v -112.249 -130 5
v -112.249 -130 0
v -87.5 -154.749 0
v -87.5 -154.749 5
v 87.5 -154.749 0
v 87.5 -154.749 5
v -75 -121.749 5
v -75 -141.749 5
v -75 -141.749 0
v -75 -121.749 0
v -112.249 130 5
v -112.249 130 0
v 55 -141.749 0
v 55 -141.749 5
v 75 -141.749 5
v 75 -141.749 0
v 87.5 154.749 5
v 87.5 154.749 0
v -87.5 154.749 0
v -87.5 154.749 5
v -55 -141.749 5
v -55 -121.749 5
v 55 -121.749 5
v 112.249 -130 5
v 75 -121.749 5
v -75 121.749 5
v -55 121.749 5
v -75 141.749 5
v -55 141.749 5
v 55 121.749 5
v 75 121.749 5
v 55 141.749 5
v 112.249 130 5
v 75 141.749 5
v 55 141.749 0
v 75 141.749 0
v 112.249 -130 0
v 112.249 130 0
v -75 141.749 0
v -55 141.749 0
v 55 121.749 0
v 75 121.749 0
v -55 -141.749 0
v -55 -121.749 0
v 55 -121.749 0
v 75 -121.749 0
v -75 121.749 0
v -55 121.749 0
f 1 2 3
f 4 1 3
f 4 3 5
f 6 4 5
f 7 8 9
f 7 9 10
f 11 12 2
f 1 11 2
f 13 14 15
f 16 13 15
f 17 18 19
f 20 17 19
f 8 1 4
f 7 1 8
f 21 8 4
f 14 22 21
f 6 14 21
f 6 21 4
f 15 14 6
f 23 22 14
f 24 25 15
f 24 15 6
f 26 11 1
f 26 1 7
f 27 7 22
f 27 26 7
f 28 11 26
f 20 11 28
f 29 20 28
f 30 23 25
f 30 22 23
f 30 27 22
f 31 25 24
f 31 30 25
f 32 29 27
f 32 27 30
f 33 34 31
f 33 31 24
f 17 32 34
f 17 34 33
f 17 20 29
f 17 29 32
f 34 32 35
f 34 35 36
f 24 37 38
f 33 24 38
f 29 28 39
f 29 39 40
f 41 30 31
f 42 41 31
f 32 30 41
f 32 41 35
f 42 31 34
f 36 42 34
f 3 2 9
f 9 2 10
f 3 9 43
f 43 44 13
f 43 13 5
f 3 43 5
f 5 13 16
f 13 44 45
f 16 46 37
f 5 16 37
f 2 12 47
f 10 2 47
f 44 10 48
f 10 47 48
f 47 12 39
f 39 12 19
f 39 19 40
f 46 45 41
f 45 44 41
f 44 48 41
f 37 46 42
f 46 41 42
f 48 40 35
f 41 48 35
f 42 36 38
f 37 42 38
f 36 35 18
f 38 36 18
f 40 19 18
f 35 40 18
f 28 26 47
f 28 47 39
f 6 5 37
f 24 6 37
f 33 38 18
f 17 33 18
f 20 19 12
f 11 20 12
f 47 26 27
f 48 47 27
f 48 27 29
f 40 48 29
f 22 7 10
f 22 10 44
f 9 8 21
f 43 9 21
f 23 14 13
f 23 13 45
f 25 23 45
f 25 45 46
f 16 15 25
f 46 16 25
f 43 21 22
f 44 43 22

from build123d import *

# Parameters (mm, degrees)
BOSS_EXTRU_1_DEPTH      = 5
ESQUISSE2_W             = 20
ESQUISSE2_H             = 20
ENL_V_MAT_EXTRU_1_DEPTH = 5


with BuildPart() as part:
    # Esquisse1 → Boss.-Extru.1 (new body)
    with BuildSketch(Plane.XY):
        Polygon((-112.248737342, -130), (-87.5, -154.748737342), (87.5, -154.748737342), (112.248737342, -130), (112.248737342, 130), (87.5, 154.748737342), (-87.5, 154.748737342), (-112.248737342, 130), align=None)
    extrude(amount=BOSS_EXTRU_1_DEPTH)

    # Esquisse2 → Enlèv. mat.-Extru.1 (cut)
    with BuildSketch(Plane.XY.offset(5)):
        with Locations((-65, 131.748737342)):
            Rectangle(ESQUISSE2_W, ESQUISSE2_H)
        with Locations((-65, -131.748737342)):
            Rectangle(ESQUISSE2_W, ESQUISSE2_H)
        with Locations((65, -131.748737342)):
            Rectangle(ESQUISSE2_W, ESQUISSE2_H)
        with Locations((65, 131.748737342)):
            Rectangle(ESQUISSE2_W, ESQUISSE2_H)
    extrude(amount=-ENL_V_MAT_EXTRU_1_DEPTH, mode=Mode.SUBTRACT)


solid = part.part
